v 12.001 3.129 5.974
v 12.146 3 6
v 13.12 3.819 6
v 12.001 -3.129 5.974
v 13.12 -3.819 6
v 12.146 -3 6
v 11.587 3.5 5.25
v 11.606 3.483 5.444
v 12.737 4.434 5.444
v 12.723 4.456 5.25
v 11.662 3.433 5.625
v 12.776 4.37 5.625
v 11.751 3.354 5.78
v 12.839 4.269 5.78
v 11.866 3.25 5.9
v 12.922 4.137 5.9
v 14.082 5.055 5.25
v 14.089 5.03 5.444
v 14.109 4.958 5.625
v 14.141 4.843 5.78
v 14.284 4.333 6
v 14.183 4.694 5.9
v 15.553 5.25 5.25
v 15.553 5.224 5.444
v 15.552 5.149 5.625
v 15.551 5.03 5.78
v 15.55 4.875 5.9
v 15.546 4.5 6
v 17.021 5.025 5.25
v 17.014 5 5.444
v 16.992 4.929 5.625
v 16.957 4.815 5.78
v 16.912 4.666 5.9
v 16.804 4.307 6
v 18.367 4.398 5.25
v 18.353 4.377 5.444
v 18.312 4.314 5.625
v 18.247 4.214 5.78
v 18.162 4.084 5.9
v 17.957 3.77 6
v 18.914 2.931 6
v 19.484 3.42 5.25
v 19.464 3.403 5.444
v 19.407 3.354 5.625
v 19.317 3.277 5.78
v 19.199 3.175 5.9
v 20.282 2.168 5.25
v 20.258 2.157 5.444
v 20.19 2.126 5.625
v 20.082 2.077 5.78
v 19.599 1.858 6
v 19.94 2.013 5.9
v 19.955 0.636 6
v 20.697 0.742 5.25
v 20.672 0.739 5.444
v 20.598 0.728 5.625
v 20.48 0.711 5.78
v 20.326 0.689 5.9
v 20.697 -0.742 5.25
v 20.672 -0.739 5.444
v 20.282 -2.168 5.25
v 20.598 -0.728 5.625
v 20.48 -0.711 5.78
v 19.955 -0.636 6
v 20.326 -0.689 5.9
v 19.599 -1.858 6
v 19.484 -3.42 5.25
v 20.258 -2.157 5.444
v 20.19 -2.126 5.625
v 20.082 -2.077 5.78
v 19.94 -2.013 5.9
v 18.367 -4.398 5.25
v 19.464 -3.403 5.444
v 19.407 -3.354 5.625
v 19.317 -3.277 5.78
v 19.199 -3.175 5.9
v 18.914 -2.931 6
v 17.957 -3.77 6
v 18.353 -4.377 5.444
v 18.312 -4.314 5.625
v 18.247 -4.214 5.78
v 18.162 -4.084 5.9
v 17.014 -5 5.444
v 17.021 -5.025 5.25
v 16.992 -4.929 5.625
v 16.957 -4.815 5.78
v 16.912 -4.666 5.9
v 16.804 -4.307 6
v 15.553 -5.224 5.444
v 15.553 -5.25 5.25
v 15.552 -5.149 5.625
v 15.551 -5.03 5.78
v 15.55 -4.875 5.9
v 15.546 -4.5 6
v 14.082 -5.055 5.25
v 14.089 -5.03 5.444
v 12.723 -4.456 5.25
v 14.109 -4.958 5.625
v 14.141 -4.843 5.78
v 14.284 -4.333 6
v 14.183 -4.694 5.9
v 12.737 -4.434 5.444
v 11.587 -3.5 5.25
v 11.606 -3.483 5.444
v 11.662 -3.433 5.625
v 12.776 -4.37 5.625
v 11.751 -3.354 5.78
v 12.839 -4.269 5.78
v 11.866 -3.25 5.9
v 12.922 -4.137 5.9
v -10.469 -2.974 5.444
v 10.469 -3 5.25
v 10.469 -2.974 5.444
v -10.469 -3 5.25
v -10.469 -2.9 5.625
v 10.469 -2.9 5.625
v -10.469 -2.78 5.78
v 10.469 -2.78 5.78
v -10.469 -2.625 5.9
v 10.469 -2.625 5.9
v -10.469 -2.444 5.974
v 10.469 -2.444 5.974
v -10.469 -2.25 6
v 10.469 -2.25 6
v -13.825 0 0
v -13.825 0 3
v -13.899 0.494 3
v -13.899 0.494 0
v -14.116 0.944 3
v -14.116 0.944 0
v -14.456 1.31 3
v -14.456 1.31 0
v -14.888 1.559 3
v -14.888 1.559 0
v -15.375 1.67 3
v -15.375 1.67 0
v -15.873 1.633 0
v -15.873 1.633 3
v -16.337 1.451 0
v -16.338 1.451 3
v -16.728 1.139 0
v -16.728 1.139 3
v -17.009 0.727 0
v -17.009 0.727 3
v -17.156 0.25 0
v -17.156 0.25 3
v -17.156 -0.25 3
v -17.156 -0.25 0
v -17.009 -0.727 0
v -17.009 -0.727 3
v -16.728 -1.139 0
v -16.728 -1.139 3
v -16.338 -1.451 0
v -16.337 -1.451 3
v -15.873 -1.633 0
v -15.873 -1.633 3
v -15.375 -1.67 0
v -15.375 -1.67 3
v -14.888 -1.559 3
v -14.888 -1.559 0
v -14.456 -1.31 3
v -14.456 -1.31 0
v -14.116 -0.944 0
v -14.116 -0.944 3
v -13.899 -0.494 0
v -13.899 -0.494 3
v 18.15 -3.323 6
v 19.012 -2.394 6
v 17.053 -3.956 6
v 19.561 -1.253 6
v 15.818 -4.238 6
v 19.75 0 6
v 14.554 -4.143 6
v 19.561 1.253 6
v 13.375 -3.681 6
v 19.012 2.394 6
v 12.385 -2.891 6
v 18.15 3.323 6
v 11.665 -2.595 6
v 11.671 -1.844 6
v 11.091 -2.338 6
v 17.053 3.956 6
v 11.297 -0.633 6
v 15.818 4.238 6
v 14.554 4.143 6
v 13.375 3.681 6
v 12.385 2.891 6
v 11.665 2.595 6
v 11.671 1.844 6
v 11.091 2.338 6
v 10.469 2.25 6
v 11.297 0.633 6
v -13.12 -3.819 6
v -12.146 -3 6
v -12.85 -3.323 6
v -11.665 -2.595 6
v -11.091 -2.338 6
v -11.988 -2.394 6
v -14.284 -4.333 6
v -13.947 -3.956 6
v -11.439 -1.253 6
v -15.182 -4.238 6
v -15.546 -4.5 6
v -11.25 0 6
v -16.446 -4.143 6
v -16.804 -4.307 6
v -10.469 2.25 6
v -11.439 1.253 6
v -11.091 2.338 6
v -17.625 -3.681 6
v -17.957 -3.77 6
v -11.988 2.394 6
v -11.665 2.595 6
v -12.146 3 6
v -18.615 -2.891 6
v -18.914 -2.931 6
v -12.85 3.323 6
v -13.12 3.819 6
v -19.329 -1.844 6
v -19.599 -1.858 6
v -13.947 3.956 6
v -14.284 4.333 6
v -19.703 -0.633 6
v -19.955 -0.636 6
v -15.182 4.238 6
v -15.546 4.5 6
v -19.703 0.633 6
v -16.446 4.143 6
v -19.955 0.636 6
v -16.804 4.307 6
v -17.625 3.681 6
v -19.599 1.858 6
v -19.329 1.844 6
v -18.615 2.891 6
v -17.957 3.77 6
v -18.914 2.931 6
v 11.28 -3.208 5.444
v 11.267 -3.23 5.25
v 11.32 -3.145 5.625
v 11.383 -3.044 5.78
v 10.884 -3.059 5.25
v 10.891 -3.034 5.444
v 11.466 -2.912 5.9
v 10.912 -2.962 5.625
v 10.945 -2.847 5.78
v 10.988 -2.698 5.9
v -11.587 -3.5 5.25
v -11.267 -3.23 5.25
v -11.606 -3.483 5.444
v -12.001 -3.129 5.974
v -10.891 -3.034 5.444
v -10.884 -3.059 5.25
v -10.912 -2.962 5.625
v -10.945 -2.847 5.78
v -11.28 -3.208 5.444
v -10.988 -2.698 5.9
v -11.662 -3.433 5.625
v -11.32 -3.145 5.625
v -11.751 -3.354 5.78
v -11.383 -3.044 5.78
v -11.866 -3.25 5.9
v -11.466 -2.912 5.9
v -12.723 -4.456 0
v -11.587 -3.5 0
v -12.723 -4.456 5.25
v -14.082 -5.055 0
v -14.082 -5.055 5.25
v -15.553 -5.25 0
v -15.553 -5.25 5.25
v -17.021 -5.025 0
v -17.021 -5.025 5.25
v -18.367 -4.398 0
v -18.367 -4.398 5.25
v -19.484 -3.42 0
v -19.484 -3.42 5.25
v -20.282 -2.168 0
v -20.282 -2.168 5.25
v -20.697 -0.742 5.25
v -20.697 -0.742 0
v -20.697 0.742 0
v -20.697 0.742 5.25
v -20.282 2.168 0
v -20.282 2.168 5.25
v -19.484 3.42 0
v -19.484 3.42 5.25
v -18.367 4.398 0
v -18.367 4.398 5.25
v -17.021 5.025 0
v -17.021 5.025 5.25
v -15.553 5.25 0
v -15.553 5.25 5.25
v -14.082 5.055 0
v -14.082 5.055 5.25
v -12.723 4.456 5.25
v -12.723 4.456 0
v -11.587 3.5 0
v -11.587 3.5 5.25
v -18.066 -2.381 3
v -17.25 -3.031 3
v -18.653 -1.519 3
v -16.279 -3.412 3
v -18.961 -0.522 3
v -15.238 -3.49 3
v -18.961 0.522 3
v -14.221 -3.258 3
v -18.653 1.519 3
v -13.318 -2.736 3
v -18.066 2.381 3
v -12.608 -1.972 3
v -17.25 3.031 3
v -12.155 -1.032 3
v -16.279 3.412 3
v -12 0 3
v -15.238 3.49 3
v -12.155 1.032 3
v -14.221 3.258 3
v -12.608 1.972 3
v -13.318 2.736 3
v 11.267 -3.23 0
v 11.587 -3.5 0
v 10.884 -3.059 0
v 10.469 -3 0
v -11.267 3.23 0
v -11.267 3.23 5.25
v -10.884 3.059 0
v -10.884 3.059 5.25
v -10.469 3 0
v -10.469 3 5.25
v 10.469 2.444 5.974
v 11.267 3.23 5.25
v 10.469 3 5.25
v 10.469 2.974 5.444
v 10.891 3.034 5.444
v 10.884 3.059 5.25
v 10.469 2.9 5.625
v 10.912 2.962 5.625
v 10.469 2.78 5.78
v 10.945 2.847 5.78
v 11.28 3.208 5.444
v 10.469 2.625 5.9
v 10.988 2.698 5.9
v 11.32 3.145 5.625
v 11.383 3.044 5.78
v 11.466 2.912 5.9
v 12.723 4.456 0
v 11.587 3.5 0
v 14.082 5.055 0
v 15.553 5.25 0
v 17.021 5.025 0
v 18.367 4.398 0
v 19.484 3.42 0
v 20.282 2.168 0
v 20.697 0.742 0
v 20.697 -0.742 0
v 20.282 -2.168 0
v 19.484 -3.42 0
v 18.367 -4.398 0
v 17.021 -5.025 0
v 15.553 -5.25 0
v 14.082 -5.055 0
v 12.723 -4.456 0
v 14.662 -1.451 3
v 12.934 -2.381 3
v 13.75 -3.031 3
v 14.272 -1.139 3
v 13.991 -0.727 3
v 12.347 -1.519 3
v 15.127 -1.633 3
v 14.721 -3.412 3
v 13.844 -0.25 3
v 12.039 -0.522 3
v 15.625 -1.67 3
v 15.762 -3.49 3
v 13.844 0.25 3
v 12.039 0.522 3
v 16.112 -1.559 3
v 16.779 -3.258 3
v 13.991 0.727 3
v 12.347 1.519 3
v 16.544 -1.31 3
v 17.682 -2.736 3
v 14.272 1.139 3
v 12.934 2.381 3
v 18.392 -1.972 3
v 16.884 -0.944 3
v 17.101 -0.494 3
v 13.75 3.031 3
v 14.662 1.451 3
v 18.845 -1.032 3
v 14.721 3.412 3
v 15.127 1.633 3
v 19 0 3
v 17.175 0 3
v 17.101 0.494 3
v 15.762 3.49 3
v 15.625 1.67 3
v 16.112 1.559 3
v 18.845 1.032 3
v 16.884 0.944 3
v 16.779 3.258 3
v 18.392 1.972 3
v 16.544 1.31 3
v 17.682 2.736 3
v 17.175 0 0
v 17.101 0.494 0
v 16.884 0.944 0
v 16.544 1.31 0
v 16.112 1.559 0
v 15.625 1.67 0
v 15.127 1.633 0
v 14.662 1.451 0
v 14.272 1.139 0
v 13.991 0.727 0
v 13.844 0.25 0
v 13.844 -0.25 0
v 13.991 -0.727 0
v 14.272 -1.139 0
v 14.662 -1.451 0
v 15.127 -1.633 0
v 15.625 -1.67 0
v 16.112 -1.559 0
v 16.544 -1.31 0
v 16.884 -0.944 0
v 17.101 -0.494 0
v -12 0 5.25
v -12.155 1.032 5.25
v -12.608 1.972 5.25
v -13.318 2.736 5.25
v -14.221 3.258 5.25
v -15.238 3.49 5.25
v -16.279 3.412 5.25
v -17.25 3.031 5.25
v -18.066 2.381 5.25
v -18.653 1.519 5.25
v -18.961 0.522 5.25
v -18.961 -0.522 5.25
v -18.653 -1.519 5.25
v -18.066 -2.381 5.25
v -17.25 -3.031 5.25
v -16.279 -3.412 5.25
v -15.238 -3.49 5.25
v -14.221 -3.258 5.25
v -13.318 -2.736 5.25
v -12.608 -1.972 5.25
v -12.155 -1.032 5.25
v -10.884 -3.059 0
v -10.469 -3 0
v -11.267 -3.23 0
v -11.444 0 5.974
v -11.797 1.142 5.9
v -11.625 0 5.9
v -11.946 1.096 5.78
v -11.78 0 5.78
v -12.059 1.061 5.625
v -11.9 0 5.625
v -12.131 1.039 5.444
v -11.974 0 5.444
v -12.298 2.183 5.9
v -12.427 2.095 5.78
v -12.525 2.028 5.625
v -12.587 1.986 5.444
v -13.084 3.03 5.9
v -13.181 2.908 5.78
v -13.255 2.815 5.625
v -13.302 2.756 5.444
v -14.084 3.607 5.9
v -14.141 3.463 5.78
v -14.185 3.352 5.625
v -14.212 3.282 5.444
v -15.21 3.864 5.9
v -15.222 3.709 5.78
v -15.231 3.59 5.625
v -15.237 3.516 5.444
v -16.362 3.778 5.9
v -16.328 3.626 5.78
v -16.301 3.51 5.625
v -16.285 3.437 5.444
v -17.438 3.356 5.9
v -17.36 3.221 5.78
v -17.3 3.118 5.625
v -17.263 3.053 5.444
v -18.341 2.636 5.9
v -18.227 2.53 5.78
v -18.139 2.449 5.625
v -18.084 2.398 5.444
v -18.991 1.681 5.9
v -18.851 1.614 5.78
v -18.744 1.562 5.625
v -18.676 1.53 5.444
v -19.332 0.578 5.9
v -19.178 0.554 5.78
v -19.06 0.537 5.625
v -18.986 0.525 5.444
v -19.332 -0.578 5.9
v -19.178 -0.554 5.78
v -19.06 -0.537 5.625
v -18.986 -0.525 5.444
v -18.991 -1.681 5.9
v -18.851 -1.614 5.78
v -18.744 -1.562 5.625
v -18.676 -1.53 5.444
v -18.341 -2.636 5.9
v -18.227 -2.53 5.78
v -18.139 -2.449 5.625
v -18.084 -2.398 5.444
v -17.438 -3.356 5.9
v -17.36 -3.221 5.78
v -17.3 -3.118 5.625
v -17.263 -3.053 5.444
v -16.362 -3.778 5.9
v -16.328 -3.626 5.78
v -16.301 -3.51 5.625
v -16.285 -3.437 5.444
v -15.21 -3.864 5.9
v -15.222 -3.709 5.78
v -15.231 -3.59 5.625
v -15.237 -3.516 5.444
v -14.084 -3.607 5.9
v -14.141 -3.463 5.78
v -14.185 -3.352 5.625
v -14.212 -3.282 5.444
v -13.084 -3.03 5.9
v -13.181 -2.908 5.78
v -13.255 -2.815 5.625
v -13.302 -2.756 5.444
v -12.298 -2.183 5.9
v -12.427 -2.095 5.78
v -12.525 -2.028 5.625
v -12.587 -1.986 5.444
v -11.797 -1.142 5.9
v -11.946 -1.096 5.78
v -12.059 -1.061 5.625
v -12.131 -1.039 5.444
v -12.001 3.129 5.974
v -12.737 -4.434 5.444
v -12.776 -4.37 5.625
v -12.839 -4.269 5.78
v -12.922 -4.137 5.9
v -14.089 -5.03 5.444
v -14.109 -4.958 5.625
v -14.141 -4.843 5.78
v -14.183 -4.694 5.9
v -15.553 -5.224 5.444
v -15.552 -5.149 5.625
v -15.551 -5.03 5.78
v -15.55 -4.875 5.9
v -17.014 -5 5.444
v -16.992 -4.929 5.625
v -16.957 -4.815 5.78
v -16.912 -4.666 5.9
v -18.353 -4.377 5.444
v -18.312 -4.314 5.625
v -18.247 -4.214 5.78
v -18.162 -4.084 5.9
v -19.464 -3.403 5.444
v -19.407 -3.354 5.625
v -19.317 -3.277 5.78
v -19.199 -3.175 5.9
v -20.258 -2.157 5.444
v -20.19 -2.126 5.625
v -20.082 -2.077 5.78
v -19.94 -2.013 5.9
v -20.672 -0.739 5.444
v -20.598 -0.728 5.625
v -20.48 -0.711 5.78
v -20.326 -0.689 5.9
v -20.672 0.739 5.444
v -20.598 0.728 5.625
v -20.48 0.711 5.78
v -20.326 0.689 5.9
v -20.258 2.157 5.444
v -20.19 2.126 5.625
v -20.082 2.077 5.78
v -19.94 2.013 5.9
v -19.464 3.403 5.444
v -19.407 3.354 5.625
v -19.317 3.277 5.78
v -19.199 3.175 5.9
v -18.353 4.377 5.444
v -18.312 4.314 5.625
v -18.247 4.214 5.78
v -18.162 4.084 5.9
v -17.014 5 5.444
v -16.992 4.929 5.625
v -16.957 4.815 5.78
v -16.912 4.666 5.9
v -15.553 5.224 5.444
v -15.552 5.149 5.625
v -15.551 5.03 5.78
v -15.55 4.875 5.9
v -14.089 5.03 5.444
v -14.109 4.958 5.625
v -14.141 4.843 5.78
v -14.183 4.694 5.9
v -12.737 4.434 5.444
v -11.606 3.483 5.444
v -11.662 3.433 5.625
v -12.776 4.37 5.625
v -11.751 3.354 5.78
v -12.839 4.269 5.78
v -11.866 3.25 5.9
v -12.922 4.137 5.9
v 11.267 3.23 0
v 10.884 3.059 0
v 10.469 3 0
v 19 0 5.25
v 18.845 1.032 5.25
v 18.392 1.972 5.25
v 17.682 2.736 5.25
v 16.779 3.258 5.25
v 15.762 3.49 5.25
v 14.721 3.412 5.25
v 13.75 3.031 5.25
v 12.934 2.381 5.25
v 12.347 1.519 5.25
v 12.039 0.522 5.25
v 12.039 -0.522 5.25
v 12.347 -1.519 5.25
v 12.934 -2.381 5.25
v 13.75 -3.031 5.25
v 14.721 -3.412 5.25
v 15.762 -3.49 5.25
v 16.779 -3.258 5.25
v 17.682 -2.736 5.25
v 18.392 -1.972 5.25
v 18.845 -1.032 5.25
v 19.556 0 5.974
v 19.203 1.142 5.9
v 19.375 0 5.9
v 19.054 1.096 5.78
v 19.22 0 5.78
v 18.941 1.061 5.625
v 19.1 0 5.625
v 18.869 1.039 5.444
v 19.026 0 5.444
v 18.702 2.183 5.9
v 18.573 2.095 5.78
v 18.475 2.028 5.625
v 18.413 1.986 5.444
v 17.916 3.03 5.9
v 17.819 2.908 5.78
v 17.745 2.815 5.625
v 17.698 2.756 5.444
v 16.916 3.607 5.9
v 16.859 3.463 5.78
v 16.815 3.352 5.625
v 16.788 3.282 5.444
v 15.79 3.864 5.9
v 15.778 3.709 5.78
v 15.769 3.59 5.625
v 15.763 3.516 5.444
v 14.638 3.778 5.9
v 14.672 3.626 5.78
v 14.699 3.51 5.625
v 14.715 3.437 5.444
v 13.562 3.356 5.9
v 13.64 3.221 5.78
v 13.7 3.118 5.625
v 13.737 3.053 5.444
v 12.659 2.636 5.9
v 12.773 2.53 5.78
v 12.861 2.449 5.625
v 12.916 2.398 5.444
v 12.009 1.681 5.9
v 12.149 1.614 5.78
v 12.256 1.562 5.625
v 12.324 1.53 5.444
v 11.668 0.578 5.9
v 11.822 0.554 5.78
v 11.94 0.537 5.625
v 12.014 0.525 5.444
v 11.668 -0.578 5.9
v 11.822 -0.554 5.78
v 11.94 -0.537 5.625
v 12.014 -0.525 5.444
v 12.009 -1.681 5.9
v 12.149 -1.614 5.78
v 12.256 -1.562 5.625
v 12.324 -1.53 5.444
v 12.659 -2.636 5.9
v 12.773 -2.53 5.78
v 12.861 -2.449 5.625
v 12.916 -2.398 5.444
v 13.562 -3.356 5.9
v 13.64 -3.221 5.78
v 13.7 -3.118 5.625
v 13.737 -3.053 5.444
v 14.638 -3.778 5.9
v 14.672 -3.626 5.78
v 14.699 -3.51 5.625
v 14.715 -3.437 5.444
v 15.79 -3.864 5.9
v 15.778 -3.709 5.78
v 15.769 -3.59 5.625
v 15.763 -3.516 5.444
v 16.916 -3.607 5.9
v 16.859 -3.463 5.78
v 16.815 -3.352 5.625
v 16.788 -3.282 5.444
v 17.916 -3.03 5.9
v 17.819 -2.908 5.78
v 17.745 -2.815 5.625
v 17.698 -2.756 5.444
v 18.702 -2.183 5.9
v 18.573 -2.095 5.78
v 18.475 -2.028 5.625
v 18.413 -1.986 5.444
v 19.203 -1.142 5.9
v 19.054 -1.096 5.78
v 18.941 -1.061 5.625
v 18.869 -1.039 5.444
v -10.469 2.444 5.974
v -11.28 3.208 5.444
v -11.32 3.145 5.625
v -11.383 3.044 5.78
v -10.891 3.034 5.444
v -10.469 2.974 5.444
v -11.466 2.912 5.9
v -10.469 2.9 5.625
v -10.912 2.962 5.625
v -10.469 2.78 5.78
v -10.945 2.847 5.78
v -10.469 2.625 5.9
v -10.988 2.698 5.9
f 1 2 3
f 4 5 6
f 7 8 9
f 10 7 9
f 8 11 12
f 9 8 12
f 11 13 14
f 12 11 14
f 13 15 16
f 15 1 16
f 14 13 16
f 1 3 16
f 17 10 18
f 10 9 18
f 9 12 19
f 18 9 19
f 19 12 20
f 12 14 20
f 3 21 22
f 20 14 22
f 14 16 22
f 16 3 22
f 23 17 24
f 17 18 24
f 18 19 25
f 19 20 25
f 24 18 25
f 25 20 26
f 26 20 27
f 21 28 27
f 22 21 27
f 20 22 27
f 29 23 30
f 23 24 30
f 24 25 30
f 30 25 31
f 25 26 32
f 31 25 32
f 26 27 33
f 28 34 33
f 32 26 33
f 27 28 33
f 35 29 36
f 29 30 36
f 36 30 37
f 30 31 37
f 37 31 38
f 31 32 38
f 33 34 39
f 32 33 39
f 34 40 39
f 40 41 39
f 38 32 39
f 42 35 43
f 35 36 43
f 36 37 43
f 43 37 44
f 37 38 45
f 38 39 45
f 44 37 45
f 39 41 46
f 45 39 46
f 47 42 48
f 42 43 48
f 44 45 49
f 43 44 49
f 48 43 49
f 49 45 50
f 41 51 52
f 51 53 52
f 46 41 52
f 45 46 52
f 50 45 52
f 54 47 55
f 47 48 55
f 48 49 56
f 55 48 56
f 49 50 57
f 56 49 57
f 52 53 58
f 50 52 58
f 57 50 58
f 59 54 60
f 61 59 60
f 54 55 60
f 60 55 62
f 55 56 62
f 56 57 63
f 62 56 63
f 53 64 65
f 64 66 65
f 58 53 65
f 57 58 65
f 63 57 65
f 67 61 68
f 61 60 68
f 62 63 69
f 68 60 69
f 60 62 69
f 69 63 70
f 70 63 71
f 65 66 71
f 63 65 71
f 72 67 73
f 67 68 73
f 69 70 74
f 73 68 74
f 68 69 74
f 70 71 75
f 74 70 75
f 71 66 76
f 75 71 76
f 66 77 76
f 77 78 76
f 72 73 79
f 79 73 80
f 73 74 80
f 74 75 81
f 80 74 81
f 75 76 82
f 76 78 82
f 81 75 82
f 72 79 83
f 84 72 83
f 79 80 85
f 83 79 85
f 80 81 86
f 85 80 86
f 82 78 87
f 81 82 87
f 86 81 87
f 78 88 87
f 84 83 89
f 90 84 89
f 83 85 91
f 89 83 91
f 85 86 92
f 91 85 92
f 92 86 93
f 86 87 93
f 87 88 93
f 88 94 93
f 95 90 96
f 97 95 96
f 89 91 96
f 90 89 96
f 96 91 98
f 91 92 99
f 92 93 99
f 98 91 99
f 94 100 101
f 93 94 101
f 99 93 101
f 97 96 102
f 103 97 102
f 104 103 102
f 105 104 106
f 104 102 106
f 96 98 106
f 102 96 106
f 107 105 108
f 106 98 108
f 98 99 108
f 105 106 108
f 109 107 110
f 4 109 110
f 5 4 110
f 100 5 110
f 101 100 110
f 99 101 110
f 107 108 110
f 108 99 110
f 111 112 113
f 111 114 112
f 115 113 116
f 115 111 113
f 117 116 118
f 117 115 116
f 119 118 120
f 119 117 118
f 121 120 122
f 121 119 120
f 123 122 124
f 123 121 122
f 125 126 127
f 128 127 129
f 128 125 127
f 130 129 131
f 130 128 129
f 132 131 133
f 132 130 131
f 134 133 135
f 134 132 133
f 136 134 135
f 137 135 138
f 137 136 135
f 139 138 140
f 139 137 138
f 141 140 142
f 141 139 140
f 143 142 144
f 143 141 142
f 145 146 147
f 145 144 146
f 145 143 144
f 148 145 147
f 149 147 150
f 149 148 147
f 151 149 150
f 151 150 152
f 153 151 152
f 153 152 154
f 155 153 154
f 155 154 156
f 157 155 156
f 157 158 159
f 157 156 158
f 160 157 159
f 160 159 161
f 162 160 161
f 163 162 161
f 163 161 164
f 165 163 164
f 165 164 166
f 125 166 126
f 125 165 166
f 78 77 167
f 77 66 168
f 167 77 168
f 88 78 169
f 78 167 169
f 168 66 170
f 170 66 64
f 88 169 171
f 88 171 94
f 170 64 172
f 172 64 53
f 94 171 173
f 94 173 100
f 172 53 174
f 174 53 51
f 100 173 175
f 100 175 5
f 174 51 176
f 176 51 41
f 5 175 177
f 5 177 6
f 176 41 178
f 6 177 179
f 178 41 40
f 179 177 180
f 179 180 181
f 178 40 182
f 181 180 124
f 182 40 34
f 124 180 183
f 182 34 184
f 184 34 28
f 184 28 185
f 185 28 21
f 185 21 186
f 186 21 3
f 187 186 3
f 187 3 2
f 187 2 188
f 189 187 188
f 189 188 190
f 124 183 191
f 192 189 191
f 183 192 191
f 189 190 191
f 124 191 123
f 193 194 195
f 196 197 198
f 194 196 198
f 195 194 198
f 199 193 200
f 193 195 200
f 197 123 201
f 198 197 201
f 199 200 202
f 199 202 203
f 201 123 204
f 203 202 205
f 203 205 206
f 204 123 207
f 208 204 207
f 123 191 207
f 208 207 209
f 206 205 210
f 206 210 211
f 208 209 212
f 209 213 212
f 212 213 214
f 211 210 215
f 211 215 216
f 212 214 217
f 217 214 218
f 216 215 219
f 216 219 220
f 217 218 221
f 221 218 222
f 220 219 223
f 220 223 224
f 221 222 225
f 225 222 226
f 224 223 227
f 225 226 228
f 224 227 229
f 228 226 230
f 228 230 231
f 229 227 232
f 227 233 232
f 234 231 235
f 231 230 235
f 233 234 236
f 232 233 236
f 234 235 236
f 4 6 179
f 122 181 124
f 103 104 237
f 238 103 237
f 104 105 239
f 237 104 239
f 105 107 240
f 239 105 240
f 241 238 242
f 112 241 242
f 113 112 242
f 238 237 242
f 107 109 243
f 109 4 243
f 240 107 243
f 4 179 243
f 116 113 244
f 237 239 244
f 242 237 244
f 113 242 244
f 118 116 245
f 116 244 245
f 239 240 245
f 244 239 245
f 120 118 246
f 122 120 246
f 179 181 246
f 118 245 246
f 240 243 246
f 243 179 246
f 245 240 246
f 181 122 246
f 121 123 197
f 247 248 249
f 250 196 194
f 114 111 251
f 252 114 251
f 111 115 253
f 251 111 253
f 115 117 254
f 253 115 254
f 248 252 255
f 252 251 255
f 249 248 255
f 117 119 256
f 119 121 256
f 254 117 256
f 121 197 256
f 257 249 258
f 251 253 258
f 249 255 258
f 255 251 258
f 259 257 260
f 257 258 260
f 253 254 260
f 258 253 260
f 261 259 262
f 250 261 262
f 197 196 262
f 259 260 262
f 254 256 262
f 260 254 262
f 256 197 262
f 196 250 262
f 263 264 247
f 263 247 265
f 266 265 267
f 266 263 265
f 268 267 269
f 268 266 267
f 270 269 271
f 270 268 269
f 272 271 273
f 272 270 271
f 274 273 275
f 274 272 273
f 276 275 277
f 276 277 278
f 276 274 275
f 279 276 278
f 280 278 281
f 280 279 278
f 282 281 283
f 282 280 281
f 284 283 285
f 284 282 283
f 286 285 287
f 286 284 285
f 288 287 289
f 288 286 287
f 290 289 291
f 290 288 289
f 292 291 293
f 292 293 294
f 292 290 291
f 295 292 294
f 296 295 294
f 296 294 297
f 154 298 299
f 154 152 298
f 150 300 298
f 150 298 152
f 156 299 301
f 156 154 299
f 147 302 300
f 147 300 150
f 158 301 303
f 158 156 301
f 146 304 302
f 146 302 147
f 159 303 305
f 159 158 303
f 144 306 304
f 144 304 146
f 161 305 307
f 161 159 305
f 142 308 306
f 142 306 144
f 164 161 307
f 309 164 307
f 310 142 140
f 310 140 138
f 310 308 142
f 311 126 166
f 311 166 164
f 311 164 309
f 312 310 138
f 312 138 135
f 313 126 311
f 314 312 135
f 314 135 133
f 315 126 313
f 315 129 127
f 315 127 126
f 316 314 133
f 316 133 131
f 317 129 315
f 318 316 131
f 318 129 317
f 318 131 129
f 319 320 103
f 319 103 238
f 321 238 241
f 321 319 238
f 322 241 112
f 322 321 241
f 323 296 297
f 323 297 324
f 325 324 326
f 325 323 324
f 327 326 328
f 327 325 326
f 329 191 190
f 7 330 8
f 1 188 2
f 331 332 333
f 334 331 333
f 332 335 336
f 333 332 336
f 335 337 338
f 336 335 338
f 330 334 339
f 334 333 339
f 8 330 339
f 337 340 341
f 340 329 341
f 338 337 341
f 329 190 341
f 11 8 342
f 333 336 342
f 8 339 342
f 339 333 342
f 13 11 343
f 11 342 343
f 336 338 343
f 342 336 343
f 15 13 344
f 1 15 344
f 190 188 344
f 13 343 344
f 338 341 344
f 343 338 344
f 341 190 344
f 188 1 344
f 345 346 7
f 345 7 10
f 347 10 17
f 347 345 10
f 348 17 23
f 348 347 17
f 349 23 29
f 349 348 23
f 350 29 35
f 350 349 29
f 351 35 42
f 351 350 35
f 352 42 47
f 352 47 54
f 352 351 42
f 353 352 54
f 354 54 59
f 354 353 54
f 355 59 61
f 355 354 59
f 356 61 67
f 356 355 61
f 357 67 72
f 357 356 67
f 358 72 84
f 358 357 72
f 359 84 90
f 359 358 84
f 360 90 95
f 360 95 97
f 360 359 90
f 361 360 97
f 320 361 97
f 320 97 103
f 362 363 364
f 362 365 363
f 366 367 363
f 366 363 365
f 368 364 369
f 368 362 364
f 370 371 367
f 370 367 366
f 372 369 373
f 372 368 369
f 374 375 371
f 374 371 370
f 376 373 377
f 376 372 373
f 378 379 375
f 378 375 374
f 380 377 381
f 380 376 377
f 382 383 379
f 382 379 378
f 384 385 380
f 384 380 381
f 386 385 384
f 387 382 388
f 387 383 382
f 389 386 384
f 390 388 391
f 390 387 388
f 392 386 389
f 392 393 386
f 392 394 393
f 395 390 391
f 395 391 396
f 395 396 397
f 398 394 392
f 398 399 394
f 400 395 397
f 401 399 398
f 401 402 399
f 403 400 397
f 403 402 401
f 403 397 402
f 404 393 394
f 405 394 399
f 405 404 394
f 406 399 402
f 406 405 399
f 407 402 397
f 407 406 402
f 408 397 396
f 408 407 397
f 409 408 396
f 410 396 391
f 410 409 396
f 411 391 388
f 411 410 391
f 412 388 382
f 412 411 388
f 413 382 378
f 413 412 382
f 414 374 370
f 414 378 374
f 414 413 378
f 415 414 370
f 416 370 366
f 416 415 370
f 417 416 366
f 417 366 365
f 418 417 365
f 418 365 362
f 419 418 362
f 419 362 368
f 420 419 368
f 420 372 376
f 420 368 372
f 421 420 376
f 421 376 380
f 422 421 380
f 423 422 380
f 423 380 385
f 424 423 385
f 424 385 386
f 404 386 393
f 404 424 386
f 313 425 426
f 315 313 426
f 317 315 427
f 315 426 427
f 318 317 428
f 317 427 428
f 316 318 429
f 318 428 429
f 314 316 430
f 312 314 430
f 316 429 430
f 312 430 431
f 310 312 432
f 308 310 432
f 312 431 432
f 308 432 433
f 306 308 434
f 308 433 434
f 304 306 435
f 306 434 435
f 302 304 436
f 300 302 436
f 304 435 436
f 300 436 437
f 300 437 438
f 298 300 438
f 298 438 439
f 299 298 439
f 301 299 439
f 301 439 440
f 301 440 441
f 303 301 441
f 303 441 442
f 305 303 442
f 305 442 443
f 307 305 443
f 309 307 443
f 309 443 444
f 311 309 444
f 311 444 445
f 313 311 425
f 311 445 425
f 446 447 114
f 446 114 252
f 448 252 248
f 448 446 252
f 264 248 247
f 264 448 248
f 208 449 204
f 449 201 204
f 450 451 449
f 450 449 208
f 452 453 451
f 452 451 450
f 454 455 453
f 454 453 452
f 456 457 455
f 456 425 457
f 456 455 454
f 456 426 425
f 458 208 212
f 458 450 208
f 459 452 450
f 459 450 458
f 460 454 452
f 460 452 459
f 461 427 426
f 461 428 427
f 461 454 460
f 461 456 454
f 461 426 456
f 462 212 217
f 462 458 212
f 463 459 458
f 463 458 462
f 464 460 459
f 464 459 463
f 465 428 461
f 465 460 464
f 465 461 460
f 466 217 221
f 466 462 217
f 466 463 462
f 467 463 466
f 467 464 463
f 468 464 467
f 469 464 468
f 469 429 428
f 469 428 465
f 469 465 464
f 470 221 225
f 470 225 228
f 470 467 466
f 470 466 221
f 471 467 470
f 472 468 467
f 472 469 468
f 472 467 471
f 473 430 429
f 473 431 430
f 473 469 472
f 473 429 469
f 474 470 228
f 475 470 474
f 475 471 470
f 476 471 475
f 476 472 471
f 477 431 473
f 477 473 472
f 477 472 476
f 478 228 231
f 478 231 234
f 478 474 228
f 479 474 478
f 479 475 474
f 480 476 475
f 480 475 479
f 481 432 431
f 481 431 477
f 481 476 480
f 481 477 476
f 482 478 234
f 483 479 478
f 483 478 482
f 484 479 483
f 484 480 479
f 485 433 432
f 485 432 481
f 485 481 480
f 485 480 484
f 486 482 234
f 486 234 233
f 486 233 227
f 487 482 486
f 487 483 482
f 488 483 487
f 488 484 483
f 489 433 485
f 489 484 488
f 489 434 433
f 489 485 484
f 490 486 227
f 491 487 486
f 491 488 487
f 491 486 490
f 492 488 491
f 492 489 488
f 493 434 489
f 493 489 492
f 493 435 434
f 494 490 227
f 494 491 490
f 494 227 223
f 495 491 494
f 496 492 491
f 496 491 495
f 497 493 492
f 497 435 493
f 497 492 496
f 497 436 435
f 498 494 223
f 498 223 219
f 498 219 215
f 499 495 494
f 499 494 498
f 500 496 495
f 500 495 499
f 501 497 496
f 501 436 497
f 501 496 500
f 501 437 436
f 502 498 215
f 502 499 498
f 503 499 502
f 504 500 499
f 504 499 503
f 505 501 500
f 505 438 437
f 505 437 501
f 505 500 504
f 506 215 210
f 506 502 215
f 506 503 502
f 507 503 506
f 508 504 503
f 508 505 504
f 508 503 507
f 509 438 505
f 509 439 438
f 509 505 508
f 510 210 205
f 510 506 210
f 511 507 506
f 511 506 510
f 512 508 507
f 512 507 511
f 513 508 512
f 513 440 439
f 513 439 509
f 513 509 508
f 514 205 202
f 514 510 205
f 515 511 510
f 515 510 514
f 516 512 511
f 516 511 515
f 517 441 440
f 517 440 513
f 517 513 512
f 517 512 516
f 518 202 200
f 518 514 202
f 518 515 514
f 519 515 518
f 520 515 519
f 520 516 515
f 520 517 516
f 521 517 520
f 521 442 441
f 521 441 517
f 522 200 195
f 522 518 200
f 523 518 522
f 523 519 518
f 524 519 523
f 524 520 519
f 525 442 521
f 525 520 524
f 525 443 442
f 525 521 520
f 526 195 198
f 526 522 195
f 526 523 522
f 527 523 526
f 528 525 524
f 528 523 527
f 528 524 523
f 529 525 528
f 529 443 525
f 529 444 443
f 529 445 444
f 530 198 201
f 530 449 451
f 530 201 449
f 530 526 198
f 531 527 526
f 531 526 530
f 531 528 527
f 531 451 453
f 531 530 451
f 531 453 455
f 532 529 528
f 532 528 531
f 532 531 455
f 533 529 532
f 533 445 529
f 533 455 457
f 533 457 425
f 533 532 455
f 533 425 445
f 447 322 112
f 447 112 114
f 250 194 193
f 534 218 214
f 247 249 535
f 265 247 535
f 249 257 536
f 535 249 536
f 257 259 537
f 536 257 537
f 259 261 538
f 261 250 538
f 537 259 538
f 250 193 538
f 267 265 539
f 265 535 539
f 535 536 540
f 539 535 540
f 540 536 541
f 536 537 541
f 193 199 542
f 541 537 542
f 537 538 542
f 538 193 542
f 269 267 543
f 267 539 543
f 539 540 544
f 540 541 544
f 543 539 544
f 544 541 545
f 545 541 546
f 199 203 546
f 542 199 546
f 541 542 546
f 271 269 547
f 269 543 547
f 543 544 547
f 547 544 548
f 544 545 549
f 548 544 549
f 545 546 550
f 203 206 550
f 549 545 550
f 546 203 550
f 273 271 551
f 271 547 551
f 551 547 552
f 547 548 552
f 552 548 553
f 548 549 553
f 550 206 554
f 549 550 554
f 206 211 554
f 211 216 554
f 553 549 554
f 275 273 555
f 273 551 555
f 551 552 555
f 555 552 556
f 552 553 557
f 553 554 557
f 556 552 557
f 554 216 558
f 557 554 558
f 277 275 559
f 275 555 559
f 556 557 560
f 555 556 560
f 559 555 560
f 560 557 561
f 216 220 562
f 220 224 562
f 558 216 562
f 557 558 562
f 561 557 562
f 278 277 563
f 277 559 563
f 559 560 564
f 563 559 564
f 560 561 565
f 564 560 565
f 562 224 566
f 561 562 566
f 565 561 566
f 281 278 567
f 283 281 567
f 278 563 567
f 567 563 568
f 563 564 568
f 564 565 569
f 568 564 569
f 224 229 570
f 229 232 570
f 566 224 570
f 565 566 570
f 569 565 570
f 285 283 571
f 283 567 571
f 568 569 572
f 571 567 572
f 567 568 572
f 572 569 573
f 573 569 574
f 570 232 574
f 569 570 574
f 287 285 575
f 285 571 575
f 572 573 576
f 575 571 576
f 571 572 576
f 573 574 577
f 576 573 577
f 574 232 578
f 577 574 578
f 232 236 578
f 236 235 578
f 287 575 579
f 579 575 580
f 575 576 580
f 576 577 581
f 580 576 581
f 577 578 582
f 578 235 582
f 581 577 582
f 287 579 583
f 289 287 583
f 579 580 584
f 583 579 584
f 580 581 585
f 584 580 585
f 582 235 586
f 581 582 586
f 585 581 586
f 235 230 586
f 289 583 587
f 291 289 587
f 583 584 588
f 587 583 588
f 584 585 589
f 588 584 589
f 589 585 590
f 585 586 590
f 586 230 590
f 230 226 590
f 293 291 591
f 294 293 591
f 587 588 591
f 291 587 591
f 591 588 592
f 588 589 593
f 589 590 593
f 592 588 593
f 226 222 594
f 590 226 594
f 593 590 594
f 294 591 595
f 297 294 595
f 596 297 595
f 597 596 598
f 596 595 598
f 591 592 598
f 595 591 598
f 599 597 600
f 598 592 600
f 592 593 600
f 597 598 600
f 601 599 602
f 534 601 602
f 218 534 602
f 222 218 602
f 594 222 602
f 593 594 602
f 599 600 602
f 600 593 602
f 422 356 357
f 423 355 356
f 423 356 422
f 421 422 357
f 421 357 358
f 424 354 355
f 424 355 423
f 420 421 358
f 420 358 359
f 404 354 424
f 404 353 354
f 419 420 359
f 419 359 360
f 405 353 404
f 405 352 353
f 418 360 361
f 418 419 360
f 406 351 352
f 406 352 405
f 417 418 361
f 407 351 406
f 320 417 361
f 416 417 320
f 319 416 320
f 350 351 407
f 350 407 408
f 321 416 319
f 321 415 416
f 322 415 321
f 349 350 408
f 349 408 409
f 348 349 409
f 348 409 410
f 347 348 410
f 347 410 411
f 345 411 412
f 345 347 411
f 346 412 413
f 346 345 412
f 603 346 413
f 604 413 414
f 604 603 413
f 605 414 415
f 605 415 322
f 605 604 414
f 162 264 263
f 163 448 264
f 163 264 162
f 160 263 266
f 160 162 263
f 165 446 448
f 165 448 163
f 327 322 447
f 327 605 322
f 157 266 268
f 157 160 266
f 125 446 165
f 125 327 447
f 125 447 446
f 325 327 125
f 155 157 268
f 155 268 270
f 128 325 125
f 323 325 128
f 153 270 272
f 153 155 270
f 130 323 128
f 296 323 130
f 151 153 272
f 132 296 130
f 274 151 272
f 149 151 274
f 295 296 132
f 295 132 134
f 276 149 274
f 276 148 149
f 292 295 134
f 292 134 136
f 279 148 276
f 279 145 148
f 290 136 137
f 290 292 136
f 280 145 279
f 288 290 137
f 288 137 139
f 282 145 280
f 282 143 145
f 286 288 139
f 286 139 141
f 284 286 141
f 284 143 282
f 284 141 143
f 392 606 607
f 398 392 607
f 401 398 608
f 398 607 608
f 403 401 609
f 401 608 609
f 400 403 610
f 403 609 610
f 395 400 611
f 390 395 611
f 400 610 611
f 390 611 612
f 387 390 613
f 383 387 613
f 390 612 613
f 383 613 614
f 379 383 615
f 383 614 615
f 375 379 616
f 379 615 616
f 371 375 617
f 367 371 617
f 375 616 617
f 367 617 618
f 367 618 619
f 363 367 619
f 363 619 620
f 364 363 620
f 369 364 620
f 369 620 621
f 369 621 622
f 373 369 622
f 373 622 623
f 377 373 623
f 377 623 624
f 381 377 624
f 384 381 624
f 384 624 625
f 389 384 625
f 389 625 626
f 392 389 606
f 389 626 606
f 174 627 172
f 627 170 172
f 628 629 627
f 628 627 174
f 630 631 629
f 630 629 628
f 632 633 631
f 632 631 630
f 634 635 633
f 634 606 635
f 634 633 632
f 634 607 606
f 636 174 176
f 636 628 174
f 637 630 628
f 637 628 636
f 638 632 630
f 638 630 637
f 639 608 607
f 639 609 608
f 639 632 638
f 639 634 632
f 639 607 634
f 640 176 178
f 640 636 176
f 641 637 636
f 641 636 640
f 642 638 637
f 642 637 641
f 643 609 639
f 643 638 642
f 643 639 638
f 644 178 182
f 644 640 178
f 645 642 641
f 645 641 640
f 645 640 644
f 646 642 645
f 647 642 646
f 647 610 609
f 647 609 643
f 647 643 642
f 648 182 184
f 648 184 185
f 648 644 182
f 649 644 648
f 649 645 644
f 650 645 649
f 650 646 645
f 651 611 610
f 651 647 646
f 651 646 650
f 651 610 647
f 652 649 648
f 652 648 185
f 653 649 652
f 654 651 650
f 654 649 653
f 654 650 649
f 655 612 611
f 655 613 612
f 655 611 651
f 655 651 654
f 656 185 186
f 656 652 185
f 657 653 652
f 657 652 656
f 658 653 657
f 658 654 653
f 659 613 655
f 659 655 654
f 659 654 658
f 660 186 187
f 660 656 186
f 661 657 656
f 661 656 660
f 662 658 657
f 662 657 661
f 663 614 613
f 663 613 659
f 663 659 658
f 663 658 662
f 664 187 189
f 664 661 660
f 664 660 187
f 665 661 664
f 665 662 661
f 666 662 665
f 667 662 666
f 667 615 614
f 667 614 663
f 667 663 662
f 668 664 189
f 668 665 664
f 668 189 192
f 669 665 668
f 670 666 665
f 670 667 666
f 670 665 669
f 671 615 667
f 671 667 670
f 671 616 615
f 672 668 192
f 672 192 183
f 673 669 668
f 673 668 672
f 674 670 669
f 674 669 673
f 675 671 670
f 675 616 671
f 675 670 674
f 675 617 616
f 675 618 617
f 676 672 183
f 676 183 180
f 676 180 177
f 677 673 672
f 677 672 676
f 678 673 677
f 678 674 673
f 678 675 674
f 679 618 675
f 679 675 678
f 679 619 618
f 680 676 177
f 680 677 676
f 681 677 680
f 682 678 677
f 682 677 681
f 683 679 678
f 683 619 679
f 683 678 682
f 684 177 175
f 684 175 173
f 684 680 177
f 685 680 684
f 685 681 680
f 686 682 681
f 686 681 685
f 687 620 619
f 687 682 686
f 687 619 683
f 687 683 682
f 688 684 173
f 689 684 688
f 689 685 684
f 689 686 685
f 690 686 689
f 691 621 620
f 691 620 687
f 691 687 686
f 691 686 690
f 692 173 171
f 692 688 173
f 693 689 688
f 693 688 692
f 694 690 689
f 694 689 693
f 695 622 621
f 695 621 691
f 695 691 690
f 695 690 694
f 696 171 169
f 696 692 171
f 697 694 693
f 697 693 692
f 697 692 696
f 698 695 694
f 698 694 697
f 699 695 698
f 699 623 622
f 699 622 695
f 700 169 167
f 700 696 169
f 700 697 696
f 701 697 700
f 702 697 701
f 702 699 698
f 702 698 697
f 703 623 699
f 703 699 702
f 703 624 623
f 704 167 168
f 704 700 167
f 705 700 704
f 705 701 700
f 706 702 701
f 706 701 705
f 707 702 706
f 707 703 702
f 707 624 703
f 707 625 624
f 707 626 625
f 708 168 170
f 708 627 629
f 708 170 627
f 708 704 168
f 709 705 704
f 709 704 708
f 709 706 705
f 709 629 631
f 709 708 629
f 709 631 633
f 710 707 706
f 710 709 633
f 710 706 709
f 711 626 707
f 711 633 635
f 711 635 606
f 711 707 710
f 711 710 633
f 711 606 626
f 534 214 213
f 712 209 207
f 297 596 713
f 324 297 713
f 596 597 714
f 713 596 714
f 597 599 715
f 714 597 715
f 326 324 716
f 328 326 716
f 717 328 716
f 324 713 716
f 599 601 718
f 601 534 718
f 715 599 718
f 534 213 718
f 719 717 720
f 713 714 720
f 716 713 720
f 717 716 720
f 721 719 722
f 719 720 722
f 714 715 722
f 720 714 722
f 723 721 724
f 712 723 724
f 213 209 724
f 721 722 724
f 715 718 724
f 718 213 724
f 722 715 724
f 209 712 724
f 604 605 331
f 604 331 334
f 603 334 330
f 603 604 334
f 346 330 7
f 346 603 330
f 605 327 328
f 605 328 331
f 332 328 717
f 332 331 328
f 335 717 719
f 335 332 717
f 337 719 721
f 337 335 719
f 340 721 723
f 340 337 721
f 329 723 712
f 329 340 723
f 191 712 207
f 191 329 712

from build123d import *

# Parameters (mm, degrees)
SKETCH1_R           = 1.675
BOSS_EXTRUDE1_DEPTH = 6
SKETCH2_R           = 3.5
CUT_EXTRUDE1_DEPTH  = 3
FILLET1_R           = 0.75


with BuildPart() as part:
    # Sketch1 → Boss-Extrude1 (new body)
    with BuildSketch(Plane.XY):
        with BuildLine():
            Line((-10.468847051, 3), (10.468847051, 3))
            ThreePointArc((10.468847051, 3), (11.081219486, 3.130693606), (11.586881039, 3.5))
            ThreePointArc((11.586881039, 3.5), (20.75, 0), (11.586881039, -3.5))
            ThreePointArc((11.586881039, -3.5), (11.081219486, -3.130693606), (10.468847051, -3))
            Line((10.468847051, -3), (-10.468847051, -3))
            ThreePointArc((-10.468847051, -3), (-11.081219486, -3.130693606), (-11.586881039, -3.5))
            ThreePointArc((-11.586881039, -3.5), (-20.75, 0), (-11.586881039, 3.5))
            ThreePointArc((-11.586881039, 3.5), (-11.081219486, 3.130693606), (-10.468847051, 3))
        make_face()
        with Locations((15.5, 0)):
            Circle(SKETCH1_R, mode=Mode.SUBTRACT)
        with Locations((-15.5, 0)):
            Circle(SKETCH1_R, mode=Mode.SUBTRACT)
    extrude(amount=BOSS_EXTRUDE1_DEPTH)

    # Sketch2 → Cut-Extrude1 (cut)
    with BuildSketch(Plane.XY.offset(6)):
        with Locations((-15.5, 0)):
            Circle(SKETCH2_R)
        with Locations((15.5, 0)):
            Circle(SKETCH2_R)
    extrude(amount=-CUT_EXTRUDE1_DEPTH, mode=Mode.SUBTRACT)

    # Fillet1
    fillet1_edges = [part.edges().sort_by_distance(p)[0] for p in [
        (11.081219486, 3.130693606, 6),
        (0, 3, 6),
        (-11.081219486, 3.130693606, 6),
        (-20.75, 0, 6),
        (-11.081219486, -3.130693606, 6),
        (0, -3, 6),
        (-19, 0, 6),
        (12, 0, 6),
        (11.081219486, -3.130693606, 6),
        (20.75, 0, 6),
    ]]
    fillet(fillet1_edges, radius=FILLET1_R)


solid = part.part
